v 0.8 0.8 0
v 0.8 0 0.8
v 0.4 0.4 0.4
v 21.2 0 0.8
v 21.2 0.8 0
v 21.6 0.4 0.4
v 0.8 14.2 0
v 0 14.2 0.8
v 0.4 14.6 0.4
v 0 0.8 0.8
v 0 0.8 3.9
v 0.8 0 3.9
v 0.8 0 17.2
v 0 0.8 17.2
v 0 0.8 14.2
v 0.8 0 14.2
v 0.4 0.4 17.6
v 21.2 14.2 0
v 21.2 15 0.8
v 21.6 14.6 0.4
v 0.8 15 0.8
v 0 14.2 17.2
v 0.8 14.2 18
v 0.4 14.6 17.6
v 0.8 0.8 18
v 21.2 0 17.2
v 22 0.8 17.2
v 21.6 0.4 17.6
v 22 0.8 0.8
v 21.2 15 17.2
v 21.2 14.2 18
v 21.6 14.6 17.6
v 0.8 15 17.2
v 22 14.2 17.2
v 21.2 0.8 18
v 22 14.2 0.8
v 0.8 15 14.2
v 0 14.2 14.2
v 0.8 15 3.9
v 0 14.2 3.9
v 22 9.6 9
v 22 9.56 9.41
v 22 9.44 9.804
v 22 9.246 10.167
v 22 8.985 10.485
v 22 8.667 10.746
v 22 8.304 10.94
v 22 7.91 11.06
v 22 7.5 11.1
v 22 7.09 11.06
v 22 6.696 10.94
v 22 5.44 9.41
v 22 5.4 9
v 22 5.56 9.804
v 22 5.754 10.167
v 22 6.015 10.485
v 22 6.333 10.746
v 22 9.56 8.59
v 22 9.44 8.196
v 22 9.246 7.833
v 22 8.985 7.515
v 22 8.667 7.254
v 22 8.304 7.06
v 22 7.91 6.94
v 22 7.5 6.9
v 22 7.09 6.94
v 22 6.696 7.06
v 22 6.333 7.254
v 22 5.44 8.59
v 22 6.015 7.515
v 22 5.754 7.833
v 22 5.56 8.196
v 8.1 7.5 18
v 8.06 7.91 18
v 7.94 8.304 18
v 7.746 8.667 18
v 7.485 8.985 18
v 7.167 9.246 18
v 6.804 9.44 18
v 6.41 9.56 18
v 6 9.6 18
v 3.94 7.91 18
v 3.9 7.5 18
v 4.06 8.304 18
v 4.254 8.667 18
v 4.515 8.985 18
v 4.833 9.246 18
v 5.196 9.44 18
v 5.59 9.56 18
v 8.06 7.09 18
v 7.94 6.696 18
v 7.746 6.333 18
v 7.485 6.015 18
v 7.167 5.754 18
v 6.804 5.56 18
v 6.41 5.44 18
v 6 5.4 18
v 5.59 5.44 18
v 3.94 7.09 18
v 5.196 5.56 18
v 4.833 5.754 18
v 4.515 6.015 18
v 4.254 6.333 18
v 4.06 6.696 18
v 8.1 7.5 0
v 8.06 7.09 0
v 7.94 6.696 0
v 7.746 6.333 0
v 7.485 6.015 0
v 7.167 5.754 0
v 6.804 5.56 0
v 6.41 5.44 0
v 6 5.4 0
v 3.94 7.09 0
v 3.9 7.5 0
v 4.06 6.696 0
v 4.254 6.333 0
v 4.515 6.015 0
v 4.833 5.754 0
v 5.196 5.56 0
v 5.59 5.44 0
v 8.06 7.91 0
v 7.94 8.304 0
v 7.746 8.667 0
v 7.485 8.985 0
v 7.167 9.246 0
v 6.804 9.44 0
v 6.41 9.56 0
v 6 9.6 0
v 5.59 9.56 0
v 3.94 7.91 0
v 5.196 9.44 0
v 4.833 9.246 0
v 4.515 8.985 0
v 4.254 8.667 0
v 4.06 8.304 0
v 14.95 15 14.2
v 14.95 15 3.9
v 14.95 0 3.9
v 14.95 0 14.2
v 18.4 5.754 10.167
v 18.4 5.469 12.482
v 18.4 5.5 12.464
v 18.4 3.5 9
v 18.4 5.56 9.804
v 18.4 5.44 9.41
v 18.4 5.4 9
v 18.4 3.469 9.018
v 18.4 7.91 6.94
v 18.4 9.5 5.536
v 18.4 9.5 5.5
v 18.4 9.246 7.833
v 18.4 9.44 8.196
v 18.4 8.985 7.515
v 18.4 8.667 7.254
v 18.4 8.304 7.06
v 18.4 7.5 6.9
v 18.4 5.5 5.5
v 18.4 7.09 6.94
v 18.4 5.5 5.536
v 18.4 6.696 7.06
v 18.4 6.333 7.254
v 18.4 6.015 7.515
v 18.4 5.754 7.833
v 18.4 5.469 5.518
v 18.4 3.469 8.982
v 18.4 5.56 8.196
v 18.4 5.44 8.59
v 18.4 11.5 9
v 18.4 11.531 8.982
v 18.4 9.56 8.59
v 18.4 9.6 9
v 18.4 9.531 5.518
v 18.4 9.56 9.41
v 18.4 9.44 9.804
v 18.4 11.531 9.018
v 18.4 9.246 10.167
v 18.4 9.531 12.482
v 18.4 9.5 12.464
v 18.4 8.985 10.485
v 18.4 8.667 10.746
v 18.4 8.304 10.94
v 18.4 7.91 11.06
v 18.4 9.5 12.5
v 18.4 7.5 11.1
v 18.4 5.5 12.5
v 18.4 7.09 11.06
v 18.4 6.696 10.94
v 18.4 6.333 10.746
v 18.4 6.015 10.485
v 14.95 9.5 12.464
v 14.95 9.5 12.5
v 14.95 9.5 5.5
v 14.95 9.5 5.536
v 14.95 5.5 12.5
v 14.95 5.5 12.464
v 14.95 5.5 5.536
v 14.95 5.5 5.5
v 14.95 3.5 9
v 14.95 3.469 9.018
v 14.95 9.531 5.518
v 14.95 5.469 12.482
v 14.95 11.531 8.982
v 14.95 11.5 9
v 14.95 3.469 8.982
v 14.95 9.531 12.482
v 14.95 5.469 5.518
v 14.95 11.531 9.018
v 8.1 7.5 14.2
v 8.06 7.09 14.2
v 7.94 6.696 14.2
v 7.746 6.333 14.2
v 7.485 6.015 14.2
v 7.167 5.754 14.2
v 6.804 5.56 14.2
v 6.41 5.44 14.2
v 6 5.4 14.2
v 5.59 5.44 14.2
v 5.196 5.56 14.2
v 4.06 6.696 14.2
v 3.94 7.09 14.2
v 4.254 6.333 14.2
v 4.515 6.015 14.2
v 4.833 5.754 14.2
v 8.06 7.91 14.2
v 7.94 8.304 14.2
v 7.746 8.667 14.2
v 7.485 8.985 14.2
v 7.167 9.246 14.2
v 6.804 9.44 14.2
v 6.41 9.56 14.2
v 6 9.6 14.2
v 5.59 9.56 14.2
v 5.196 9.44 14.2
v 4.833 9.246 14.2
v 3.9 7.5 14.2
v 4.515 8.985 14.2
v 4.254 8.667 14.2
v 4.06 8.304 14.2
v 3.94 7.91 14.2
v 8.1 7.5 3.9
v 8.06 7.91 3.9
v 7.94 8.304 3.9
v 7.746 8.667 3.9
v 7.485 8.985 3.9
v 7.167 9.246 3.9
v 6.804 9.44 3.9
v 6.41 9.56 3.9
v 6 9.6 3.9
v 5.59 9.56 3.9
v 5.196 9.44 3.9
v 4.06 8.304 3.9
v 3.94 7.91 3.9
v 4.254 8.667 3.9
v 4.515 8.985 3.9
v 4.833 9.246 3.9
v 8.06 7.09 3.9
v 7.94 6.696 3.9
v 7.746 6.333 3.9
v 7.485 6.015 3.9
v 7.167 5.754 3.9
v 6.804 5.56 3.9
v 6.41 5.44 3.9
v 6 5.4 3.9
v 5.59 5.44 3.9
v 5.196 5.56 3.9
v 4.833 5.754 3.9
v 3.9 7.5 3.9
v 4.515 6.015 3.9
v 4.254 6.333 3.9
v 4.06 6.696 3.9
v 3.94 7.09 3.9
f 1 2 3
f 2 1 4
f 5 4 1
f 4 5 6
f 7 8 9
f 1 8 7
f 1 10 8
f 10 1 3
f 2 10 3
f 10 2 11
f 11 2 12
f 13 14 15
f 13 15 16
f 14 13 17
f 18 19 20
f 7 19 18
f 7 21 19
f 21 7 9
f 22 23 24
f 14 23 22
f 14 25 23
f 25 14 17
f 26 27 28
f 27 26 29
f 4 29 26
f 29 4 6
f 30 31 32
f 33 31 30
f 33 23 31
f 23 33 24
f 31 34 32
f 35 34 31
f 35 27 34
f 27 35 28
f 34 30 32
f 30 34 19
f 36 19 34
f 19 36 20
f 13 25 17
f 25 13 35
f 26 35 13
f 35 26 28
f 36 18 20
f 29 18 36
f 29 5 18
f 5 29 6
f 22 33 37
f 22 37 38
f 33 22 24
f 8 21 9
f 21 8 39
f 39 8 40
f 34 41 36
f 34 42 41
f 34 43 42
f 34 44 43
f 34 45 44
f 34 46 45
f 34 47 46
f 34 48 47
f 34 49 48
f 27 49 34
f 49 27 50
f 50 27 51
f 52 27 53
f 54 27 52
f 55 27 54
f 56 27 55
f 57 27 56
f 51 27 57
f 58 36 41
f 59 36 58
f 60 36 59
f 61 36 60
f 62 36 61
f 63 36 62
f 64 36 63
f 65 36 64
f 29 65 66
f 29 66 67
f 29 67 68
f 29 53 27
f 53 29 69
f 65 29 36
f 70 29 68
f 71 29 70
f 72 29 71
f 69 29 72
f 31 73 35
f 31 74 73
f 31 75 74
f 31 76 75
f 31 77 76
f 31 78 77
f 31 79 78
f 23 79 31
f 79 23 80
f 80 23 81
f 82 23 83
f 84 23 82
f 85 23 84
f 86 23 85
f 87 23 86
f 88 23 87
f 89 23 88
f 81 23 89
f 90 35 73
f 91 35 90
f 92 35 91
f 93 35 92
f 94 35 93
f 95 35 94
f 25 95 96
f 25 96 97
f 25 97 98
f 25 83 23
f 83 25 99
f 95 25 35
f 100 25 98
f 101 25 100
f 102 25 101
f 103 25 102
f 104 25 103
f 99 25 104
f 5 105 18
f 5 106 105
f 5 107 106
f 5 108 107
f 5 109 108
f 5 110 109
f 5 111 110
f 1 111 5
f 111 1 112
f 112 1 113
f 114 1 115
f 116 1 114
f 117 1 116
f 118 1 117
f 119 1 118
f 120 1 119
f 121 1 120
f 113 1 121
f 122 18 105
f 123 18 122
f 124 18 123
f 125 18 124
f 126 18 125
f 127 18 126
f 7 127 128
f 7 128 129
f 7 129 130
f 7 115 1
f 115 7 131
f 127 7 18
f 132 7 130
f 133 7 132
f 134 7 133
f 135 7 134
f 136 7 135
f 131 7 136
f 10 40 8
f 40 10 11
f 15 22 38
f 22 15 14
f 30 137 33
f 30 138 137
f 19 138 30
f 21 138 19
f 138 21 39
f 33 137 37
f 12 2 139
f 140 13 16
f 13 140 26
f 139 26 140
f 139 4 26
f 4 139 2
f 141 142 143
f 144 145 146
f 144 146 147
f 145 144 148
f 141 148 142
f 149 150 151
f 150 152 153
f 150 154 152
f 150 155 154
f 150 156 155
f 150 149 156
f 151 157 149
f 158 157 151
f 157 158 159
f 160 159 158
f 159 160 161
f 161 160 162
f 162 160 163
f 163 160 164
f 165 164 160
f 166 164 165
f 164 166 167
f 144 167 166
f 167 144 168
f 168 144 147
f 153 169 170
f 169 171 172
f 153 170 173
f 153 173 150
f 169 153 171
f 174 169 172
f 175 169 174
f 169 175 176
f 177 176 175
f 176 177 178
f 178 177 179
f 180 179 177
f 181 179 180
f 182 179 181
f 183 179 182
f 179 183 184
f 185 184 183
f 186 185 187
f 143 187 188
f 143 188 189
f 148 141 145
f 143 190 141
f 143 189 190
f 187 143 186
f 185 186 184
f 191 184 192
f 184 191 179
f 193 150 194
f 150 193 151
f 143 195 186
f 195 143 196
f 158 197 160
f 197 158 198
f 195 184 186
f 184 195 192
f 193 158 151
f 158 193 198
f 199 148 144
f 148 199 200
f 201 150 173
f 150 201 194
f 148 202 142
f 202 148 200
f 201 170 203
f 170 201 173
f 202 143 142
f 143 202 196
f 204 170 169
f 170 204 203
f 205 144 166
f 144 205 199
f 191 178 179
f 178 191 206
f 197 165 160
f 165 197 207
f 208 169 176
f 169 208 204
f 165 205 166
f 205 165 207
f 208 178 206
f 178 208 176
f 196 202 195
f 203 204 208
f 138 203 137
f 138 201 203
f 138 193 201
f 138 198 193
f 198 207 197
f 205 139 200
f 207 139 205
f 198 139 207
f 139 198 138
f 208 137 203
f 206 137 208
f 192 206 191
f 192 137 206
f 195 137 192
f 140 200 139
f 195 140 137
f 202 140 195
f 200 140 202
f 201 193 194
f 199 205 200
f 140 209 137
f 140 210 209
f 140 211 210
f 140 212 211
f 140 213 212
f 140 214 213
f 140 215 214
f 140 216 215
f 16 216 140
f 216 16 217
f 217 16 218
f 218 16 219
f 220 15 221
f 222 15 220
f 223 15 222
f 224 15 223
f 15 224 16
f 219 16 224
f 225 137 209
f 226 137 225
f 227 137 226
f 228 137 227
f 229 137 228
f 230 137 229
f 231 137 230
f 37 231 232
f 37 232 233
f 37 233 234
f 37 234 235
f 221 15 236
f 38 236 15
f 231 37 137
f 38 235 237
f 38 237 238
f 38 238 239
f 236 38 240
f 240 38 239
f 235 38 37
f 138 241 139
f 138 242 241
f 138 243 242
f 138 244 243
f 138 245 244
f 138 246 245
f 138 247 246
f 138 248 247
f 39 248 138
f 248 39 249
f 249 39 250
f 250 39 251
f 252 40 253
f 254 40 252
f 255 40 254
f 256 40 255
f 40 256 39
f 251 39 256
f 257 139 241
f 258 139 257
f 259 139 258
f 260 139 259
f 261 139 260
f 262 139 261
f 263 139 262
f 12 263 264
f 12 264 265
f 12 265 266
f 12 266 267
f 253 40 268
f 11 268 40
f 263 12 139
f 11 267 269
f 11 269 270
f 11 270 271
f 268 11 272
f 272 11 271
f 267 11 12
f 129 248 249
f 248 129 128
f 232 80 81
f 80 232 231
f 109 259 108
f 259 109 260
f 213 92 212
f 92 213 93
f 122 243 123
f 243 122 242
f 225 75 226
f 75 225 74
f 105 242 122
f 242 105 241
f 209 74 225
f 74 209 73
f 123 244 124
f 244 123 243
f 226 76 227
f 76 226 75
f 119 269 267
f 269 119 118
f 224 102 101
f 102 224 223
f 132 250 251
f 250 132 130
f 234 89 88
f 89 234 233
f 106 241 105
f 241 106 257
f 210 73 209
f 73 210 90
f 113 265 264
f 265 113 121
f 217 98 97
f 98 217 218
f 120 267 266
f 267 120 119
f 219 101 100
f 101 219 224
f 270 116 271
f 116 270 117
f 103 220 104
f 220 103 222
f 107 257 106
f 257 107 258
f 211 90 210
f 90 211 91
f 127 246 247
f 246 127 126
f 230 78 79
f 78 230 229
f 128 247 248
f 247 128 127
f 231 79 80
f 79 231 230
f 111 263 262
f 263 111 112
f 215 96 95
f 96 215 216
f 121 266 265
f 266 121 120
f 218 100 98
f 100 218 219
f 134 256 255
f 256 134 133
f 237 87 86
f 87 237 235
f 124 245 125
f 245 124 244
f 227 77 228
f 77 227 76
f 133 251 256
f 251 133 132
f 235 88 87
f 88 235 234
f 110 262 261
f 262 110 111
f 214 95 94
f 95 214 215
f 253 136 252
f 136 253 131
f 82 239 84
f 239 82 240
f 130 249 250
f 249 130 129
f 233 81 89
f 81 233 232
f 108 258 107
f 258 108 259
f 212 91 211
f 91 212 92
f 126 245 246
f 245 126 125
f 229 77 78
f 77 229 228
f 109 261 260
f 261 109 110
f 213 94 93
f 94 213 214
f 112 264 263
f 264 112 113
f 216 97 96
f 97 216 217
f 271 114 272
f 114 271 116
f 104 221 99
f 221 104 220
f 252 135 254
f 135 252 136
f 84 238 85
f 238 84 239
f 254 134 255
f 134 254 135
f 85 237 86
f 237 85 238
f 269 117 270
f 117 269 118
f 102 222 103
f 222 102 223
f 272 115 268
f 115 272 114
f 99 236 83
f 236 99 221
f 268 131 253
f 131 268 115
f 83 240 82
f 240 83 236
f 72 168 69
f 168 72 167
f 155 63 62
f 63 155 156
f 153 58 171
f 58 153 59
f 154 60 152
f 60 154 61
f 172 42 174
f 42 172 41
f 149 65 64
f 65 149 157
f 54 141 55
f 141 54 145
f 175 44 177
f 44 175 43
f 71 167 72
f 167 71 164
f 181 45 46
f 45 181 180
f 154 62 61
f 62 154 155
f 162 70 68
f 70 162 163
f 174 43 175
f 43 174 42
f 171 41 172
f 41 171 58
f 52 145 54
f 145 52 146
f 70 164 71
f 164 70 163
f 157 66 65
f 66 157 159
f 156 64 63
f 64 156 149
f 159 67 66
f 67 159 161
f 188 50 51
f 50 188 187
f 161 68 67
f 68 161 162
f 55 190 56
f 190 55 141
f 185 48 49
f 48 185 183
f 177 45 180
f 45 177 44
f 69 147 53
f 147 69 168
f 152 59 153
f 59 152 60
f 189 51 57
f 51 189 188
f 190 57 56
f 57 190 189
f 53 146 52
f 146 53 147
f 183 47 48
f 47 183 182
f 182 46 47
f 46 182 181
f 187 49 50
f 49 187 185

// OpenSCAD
// file: Chamfer.scad
/**
  *  The MIT License (MIT)
  *
  *  "Chamfers for OpenSCAD" v0.3 Copyright (c) 2016 SebiTimeWaster
  *
  *  Permission is hereby granted, free of charge, to any person obtaining a copy
  *  of this software and associated documentation files (the "Software"), to deal
  *  in the Software without restriction, including without limitation the rights
  *  to use, copy, modify, merge, publish, distribute, sublicense, and/or sell
  *  copies of the Software, and to permit persons to whom the Software is
  *  furnished to do so, subject to the following conditions:
  *
  *  The above copyright notice and this permission notice shall be included in all
  *  copies or substantial portions of the Software.
  *
  *  THE SOFTWARE IS PROVIDED "AS IS", WITHOUT WARRANTY OF ANY KIND, EXPRESS OR
  *  IMPLIED, INCLUDING BUT NOT LIMITED TO THE WARRANTIES OF MERCHANTABILITY,
  *  FITNESS FOR A PARTICULAR PURPOSE AND NONINFRINGEMENT. IN NO EVENT SHALL THE
  *  AUTHORS OR COPYRIGHT HOLDERS BE LIABLE FOR ANY CLAIM, DAMAGES OR OTHER
  *  LIABILITY, WHETHER IN AN ACTION OF CONTRACT, TORT OR OTHERWISE, ARISING FROM,
  *  OUT OF OR IN CONNECTION WITH THE SOFTWARE OR THE USE OR OTHER DEALINGS IN THE
  *  SOFTWARE.
  */

/**
  * chamferCube returns an cube with 45° chamfers on the edges of the
  * cube. The chamfers are diectly printable on Fused deposition
  * modelling (FDM) printers without support structures.
  *
  * @param  sizeX          The size of the cube along the x axis
  * @param  sizeY          The size of the cube along the y axis
  * @param  sizeZ          The size of the cube along the z axis
  * @param  chamferHeight  The "height" of the chamfers as seen from
  *                        one of the dimensional planes (The real
  *                        width is side c in a right angled triangle)
  * @param  chamferX       Which chamfers to render along the x axis
  *                        in clockwise order starting from the zero
  *                        point, as seen from "Left view" (Ctrl + 6)
  * @param  chamferY       Which chamfers to render along the y axis
  *                        in clockwise order starting from the zero
  *                        point, as seen from "Front view" (Ctrl + 8)
  * @param  chamferZ       Which chamfers to render along the z axis
  *                        in clockwise order starting from the zero
  *                        point, as seen from "Bottom view" (Ctrl + 5)
  */
module chamferCube(sizeX, sizeY, sizeZ, chamferHeight = 1, chamferX = [1, 1, 1, 1], chamferY = [1, 1, 1, 1], chamferZ = [1, 1, 1, 1]) {
    chamferCLength = sqrt(chamferHeight * chamferHeight * 2);
    difference() {
        cube([sizeX, sizeY, sizeZ]);
        for(x = [0 : 3]) {
            chamferSide1 = min(x, 1) - floor(x / 3); // 0 1 1 0
            chamferSide2 = floor(x / 2); // 0 0 1 1
            if(chamferX[x]) {
                translate([-0.1, chamferSide1 * sizeY, -chamferHeight + chamferSide2 * sizeZ])
                rotate([45, 0, 0])
                cube([sizeX + 0.2, chamferCLength, chamferCLength]);
            }
            if(chamferY[x]) {
                translate([-chamferHeight + chamferSide2 * sizeX, -0.1, chamferSide1 * sizeZ])
                rotate([0, 45, 0])
                cube([chamferCLength, sizeY + 0.2, chamferCLength]);
            }
            if(chamferZ[x]) {
                translate([chamferSide1 * sizeX, -chamferHeight + chamferSide2 * sizeY, -0.1])
                rotate([0, 0, 45])
                cube([chamferCLength, chamferCLength, sizeZ + 0.2]);
            }
        }
    }
}

/**
  * chamferCylinder returns an cylinder or cone with 45° chamfers on
  * the edges of the cylinder. The chamfers are diectly printable on
  * Fused deposition modelling (FDM) printers without support structures.
  *
  * @param  height         Height of the cylinder
  * @param  radius         Radius of the cylinder (At the bottom)
  * @param  radius2        Radius of the cylinder (At the top)
  * @param  chamferHeight  The "height" of the chamfers as seen from
  *                        one of the dimensional planes (The real
  *                        width is side c in a right angled triangle)
  * @param  angle          The radius of the visible part of a wedge
  *                        starting from the x axis counter-clockwise
  * @param  quality        A circle quality factor where 1.0 is a fairly
  *                        good quality, range from 0.0 to 2.0
  */
module chamferCylinder(height, radius, radius2=undef, chamferHeight = 1, angle = 0, quality = -1.0) {
    radius2 = (radius2 == undef) ? radius : radius2;
    module cc() {
        if(chamferHeight != 0) {
            translate([0, 0, height - abs(chamferHeight)]) cylinder(abs(chamferHeight), r1 = radius2, r2 = radius2 - chamferHeight, $fn = circleSegments(radius2, quality));
        }
        translate([0, 0, abs(chamferHeight)]) cylinder(height - abs(chamferHeight) * 2, r1 = radius, r2 = radius2, $fn = circleSegments(max(radius, radius2), quality));
        if(chamferHeight != 0) {
            cylinder(abs(chamferHeight), r1 = radius - chamferHeight, r2 = radius, $fn = circleSegments(radius, quality));
        }
    }
    module box(brim = abs(min(chamferHeight, 0)) + 1) {
        translate([-radius - brim, 0, -brim]) cube([radius * 2 + brim * 2, radius + brim, height + brim * 2]);
    }
    module hcc() {
        intersection() {
            cc();
            box();
        }
    }
    if(angle <= 0 || angle >= 360) cc();
    else {
        if(angle > 180) hcc();
        difference() {
            if(angle <= 180) hcc();
            else rotate([0, 0, 180]) hcc();
            rotate([0, 0, angle]) box(abs(min(chamferHeight, 0)) + radius);
        }
    }
}

/**
  * circleSegments calculates the number of segments needed to maintain
  * a constant circle quality.
  * If a globalSegementsQuality variable exist it will overwrite the
  * standard quality setting (1.0). Order of usage is:
  * Standard (1.0) <- globalCircleQuality <- Quality parameter
  *
  * @param  r        Radius of the circle
  * @param  quality  A quality factor, where 1.0 is a fairly good
  *                  quality, range from 0.0 to 2.0
  *
  * @return  The number of segments for the circle
  */
function circleSegments(r, quality = -1.0) = (r * PI * 4 + 40) * ((quality >= 0.0) ? quality : globalCircleQuality);

// set global quality to 1.0, can be overridden by user
globalCircleQuality = 1.0;
// main file
include <Chamfer.scad>;

length = 22;
width = 15;
height = 18;
bearing_height = 10.2;
bearing_space = 15;
bearing_pos = 6;
epsilon = 0.1;
fn = 32;
drill_diameter = 4.2;
// M3 = 5.5 mm, M4 = 7 mm, M5 = 8 mm, M6 = 10 mm
nut_size = 7; // [5:0.1:20]
// M3 = 3 mm, M6 = 6 mm, and so on...
nut_diameter = 4; // [3:0.1:20]
// M3 = 2.6 mm, M4 = 3.44 mm, M5 = 4.24 mm, M6 = 5.24 mm
nut_height = 3.5; // [2:0.1:15]

difference()
{
//    cube([length, width, height], center = false);
    chamferCube(length, width, height, 0.8);
    translate([-epsilon / 2, -epsilon / 2, height / 2 - bearing_height / 2]) cube([bearing_space, width + epsilon, bearing_height + epsilon], center=false);
//    translate([length - width / 2, width / 2, 0]) cylinder(d=drill_diameter,h=height + epsilon, $fn=fn);
    translate([bearing_pos, width / 2, 0]) cylinder(d=drill_diameter,h=height + epsilon, $fn=fn);
    translate([0, width / 2, height / 2]) rotate([0, 90, 0]) cylinder(d=drill_diameter,h=length + epsilon, $fn=fn);
    translate([bearing_space + nut_height / 2 - epsilon, width / 2, height / 2]) rotate([0, 90, 0]) hexagon(nut_size, nut_height, 90);
}

module hexagon(width, height, baseAngle) 
{
  bwidth = width / 1.75;
  for (angle = [baseAngle, baseAngle + 60, baseAngle + 120]) 
  {
      rotate([0, 0, angle]) cube([bwidth, width, height], true);
  }
}
